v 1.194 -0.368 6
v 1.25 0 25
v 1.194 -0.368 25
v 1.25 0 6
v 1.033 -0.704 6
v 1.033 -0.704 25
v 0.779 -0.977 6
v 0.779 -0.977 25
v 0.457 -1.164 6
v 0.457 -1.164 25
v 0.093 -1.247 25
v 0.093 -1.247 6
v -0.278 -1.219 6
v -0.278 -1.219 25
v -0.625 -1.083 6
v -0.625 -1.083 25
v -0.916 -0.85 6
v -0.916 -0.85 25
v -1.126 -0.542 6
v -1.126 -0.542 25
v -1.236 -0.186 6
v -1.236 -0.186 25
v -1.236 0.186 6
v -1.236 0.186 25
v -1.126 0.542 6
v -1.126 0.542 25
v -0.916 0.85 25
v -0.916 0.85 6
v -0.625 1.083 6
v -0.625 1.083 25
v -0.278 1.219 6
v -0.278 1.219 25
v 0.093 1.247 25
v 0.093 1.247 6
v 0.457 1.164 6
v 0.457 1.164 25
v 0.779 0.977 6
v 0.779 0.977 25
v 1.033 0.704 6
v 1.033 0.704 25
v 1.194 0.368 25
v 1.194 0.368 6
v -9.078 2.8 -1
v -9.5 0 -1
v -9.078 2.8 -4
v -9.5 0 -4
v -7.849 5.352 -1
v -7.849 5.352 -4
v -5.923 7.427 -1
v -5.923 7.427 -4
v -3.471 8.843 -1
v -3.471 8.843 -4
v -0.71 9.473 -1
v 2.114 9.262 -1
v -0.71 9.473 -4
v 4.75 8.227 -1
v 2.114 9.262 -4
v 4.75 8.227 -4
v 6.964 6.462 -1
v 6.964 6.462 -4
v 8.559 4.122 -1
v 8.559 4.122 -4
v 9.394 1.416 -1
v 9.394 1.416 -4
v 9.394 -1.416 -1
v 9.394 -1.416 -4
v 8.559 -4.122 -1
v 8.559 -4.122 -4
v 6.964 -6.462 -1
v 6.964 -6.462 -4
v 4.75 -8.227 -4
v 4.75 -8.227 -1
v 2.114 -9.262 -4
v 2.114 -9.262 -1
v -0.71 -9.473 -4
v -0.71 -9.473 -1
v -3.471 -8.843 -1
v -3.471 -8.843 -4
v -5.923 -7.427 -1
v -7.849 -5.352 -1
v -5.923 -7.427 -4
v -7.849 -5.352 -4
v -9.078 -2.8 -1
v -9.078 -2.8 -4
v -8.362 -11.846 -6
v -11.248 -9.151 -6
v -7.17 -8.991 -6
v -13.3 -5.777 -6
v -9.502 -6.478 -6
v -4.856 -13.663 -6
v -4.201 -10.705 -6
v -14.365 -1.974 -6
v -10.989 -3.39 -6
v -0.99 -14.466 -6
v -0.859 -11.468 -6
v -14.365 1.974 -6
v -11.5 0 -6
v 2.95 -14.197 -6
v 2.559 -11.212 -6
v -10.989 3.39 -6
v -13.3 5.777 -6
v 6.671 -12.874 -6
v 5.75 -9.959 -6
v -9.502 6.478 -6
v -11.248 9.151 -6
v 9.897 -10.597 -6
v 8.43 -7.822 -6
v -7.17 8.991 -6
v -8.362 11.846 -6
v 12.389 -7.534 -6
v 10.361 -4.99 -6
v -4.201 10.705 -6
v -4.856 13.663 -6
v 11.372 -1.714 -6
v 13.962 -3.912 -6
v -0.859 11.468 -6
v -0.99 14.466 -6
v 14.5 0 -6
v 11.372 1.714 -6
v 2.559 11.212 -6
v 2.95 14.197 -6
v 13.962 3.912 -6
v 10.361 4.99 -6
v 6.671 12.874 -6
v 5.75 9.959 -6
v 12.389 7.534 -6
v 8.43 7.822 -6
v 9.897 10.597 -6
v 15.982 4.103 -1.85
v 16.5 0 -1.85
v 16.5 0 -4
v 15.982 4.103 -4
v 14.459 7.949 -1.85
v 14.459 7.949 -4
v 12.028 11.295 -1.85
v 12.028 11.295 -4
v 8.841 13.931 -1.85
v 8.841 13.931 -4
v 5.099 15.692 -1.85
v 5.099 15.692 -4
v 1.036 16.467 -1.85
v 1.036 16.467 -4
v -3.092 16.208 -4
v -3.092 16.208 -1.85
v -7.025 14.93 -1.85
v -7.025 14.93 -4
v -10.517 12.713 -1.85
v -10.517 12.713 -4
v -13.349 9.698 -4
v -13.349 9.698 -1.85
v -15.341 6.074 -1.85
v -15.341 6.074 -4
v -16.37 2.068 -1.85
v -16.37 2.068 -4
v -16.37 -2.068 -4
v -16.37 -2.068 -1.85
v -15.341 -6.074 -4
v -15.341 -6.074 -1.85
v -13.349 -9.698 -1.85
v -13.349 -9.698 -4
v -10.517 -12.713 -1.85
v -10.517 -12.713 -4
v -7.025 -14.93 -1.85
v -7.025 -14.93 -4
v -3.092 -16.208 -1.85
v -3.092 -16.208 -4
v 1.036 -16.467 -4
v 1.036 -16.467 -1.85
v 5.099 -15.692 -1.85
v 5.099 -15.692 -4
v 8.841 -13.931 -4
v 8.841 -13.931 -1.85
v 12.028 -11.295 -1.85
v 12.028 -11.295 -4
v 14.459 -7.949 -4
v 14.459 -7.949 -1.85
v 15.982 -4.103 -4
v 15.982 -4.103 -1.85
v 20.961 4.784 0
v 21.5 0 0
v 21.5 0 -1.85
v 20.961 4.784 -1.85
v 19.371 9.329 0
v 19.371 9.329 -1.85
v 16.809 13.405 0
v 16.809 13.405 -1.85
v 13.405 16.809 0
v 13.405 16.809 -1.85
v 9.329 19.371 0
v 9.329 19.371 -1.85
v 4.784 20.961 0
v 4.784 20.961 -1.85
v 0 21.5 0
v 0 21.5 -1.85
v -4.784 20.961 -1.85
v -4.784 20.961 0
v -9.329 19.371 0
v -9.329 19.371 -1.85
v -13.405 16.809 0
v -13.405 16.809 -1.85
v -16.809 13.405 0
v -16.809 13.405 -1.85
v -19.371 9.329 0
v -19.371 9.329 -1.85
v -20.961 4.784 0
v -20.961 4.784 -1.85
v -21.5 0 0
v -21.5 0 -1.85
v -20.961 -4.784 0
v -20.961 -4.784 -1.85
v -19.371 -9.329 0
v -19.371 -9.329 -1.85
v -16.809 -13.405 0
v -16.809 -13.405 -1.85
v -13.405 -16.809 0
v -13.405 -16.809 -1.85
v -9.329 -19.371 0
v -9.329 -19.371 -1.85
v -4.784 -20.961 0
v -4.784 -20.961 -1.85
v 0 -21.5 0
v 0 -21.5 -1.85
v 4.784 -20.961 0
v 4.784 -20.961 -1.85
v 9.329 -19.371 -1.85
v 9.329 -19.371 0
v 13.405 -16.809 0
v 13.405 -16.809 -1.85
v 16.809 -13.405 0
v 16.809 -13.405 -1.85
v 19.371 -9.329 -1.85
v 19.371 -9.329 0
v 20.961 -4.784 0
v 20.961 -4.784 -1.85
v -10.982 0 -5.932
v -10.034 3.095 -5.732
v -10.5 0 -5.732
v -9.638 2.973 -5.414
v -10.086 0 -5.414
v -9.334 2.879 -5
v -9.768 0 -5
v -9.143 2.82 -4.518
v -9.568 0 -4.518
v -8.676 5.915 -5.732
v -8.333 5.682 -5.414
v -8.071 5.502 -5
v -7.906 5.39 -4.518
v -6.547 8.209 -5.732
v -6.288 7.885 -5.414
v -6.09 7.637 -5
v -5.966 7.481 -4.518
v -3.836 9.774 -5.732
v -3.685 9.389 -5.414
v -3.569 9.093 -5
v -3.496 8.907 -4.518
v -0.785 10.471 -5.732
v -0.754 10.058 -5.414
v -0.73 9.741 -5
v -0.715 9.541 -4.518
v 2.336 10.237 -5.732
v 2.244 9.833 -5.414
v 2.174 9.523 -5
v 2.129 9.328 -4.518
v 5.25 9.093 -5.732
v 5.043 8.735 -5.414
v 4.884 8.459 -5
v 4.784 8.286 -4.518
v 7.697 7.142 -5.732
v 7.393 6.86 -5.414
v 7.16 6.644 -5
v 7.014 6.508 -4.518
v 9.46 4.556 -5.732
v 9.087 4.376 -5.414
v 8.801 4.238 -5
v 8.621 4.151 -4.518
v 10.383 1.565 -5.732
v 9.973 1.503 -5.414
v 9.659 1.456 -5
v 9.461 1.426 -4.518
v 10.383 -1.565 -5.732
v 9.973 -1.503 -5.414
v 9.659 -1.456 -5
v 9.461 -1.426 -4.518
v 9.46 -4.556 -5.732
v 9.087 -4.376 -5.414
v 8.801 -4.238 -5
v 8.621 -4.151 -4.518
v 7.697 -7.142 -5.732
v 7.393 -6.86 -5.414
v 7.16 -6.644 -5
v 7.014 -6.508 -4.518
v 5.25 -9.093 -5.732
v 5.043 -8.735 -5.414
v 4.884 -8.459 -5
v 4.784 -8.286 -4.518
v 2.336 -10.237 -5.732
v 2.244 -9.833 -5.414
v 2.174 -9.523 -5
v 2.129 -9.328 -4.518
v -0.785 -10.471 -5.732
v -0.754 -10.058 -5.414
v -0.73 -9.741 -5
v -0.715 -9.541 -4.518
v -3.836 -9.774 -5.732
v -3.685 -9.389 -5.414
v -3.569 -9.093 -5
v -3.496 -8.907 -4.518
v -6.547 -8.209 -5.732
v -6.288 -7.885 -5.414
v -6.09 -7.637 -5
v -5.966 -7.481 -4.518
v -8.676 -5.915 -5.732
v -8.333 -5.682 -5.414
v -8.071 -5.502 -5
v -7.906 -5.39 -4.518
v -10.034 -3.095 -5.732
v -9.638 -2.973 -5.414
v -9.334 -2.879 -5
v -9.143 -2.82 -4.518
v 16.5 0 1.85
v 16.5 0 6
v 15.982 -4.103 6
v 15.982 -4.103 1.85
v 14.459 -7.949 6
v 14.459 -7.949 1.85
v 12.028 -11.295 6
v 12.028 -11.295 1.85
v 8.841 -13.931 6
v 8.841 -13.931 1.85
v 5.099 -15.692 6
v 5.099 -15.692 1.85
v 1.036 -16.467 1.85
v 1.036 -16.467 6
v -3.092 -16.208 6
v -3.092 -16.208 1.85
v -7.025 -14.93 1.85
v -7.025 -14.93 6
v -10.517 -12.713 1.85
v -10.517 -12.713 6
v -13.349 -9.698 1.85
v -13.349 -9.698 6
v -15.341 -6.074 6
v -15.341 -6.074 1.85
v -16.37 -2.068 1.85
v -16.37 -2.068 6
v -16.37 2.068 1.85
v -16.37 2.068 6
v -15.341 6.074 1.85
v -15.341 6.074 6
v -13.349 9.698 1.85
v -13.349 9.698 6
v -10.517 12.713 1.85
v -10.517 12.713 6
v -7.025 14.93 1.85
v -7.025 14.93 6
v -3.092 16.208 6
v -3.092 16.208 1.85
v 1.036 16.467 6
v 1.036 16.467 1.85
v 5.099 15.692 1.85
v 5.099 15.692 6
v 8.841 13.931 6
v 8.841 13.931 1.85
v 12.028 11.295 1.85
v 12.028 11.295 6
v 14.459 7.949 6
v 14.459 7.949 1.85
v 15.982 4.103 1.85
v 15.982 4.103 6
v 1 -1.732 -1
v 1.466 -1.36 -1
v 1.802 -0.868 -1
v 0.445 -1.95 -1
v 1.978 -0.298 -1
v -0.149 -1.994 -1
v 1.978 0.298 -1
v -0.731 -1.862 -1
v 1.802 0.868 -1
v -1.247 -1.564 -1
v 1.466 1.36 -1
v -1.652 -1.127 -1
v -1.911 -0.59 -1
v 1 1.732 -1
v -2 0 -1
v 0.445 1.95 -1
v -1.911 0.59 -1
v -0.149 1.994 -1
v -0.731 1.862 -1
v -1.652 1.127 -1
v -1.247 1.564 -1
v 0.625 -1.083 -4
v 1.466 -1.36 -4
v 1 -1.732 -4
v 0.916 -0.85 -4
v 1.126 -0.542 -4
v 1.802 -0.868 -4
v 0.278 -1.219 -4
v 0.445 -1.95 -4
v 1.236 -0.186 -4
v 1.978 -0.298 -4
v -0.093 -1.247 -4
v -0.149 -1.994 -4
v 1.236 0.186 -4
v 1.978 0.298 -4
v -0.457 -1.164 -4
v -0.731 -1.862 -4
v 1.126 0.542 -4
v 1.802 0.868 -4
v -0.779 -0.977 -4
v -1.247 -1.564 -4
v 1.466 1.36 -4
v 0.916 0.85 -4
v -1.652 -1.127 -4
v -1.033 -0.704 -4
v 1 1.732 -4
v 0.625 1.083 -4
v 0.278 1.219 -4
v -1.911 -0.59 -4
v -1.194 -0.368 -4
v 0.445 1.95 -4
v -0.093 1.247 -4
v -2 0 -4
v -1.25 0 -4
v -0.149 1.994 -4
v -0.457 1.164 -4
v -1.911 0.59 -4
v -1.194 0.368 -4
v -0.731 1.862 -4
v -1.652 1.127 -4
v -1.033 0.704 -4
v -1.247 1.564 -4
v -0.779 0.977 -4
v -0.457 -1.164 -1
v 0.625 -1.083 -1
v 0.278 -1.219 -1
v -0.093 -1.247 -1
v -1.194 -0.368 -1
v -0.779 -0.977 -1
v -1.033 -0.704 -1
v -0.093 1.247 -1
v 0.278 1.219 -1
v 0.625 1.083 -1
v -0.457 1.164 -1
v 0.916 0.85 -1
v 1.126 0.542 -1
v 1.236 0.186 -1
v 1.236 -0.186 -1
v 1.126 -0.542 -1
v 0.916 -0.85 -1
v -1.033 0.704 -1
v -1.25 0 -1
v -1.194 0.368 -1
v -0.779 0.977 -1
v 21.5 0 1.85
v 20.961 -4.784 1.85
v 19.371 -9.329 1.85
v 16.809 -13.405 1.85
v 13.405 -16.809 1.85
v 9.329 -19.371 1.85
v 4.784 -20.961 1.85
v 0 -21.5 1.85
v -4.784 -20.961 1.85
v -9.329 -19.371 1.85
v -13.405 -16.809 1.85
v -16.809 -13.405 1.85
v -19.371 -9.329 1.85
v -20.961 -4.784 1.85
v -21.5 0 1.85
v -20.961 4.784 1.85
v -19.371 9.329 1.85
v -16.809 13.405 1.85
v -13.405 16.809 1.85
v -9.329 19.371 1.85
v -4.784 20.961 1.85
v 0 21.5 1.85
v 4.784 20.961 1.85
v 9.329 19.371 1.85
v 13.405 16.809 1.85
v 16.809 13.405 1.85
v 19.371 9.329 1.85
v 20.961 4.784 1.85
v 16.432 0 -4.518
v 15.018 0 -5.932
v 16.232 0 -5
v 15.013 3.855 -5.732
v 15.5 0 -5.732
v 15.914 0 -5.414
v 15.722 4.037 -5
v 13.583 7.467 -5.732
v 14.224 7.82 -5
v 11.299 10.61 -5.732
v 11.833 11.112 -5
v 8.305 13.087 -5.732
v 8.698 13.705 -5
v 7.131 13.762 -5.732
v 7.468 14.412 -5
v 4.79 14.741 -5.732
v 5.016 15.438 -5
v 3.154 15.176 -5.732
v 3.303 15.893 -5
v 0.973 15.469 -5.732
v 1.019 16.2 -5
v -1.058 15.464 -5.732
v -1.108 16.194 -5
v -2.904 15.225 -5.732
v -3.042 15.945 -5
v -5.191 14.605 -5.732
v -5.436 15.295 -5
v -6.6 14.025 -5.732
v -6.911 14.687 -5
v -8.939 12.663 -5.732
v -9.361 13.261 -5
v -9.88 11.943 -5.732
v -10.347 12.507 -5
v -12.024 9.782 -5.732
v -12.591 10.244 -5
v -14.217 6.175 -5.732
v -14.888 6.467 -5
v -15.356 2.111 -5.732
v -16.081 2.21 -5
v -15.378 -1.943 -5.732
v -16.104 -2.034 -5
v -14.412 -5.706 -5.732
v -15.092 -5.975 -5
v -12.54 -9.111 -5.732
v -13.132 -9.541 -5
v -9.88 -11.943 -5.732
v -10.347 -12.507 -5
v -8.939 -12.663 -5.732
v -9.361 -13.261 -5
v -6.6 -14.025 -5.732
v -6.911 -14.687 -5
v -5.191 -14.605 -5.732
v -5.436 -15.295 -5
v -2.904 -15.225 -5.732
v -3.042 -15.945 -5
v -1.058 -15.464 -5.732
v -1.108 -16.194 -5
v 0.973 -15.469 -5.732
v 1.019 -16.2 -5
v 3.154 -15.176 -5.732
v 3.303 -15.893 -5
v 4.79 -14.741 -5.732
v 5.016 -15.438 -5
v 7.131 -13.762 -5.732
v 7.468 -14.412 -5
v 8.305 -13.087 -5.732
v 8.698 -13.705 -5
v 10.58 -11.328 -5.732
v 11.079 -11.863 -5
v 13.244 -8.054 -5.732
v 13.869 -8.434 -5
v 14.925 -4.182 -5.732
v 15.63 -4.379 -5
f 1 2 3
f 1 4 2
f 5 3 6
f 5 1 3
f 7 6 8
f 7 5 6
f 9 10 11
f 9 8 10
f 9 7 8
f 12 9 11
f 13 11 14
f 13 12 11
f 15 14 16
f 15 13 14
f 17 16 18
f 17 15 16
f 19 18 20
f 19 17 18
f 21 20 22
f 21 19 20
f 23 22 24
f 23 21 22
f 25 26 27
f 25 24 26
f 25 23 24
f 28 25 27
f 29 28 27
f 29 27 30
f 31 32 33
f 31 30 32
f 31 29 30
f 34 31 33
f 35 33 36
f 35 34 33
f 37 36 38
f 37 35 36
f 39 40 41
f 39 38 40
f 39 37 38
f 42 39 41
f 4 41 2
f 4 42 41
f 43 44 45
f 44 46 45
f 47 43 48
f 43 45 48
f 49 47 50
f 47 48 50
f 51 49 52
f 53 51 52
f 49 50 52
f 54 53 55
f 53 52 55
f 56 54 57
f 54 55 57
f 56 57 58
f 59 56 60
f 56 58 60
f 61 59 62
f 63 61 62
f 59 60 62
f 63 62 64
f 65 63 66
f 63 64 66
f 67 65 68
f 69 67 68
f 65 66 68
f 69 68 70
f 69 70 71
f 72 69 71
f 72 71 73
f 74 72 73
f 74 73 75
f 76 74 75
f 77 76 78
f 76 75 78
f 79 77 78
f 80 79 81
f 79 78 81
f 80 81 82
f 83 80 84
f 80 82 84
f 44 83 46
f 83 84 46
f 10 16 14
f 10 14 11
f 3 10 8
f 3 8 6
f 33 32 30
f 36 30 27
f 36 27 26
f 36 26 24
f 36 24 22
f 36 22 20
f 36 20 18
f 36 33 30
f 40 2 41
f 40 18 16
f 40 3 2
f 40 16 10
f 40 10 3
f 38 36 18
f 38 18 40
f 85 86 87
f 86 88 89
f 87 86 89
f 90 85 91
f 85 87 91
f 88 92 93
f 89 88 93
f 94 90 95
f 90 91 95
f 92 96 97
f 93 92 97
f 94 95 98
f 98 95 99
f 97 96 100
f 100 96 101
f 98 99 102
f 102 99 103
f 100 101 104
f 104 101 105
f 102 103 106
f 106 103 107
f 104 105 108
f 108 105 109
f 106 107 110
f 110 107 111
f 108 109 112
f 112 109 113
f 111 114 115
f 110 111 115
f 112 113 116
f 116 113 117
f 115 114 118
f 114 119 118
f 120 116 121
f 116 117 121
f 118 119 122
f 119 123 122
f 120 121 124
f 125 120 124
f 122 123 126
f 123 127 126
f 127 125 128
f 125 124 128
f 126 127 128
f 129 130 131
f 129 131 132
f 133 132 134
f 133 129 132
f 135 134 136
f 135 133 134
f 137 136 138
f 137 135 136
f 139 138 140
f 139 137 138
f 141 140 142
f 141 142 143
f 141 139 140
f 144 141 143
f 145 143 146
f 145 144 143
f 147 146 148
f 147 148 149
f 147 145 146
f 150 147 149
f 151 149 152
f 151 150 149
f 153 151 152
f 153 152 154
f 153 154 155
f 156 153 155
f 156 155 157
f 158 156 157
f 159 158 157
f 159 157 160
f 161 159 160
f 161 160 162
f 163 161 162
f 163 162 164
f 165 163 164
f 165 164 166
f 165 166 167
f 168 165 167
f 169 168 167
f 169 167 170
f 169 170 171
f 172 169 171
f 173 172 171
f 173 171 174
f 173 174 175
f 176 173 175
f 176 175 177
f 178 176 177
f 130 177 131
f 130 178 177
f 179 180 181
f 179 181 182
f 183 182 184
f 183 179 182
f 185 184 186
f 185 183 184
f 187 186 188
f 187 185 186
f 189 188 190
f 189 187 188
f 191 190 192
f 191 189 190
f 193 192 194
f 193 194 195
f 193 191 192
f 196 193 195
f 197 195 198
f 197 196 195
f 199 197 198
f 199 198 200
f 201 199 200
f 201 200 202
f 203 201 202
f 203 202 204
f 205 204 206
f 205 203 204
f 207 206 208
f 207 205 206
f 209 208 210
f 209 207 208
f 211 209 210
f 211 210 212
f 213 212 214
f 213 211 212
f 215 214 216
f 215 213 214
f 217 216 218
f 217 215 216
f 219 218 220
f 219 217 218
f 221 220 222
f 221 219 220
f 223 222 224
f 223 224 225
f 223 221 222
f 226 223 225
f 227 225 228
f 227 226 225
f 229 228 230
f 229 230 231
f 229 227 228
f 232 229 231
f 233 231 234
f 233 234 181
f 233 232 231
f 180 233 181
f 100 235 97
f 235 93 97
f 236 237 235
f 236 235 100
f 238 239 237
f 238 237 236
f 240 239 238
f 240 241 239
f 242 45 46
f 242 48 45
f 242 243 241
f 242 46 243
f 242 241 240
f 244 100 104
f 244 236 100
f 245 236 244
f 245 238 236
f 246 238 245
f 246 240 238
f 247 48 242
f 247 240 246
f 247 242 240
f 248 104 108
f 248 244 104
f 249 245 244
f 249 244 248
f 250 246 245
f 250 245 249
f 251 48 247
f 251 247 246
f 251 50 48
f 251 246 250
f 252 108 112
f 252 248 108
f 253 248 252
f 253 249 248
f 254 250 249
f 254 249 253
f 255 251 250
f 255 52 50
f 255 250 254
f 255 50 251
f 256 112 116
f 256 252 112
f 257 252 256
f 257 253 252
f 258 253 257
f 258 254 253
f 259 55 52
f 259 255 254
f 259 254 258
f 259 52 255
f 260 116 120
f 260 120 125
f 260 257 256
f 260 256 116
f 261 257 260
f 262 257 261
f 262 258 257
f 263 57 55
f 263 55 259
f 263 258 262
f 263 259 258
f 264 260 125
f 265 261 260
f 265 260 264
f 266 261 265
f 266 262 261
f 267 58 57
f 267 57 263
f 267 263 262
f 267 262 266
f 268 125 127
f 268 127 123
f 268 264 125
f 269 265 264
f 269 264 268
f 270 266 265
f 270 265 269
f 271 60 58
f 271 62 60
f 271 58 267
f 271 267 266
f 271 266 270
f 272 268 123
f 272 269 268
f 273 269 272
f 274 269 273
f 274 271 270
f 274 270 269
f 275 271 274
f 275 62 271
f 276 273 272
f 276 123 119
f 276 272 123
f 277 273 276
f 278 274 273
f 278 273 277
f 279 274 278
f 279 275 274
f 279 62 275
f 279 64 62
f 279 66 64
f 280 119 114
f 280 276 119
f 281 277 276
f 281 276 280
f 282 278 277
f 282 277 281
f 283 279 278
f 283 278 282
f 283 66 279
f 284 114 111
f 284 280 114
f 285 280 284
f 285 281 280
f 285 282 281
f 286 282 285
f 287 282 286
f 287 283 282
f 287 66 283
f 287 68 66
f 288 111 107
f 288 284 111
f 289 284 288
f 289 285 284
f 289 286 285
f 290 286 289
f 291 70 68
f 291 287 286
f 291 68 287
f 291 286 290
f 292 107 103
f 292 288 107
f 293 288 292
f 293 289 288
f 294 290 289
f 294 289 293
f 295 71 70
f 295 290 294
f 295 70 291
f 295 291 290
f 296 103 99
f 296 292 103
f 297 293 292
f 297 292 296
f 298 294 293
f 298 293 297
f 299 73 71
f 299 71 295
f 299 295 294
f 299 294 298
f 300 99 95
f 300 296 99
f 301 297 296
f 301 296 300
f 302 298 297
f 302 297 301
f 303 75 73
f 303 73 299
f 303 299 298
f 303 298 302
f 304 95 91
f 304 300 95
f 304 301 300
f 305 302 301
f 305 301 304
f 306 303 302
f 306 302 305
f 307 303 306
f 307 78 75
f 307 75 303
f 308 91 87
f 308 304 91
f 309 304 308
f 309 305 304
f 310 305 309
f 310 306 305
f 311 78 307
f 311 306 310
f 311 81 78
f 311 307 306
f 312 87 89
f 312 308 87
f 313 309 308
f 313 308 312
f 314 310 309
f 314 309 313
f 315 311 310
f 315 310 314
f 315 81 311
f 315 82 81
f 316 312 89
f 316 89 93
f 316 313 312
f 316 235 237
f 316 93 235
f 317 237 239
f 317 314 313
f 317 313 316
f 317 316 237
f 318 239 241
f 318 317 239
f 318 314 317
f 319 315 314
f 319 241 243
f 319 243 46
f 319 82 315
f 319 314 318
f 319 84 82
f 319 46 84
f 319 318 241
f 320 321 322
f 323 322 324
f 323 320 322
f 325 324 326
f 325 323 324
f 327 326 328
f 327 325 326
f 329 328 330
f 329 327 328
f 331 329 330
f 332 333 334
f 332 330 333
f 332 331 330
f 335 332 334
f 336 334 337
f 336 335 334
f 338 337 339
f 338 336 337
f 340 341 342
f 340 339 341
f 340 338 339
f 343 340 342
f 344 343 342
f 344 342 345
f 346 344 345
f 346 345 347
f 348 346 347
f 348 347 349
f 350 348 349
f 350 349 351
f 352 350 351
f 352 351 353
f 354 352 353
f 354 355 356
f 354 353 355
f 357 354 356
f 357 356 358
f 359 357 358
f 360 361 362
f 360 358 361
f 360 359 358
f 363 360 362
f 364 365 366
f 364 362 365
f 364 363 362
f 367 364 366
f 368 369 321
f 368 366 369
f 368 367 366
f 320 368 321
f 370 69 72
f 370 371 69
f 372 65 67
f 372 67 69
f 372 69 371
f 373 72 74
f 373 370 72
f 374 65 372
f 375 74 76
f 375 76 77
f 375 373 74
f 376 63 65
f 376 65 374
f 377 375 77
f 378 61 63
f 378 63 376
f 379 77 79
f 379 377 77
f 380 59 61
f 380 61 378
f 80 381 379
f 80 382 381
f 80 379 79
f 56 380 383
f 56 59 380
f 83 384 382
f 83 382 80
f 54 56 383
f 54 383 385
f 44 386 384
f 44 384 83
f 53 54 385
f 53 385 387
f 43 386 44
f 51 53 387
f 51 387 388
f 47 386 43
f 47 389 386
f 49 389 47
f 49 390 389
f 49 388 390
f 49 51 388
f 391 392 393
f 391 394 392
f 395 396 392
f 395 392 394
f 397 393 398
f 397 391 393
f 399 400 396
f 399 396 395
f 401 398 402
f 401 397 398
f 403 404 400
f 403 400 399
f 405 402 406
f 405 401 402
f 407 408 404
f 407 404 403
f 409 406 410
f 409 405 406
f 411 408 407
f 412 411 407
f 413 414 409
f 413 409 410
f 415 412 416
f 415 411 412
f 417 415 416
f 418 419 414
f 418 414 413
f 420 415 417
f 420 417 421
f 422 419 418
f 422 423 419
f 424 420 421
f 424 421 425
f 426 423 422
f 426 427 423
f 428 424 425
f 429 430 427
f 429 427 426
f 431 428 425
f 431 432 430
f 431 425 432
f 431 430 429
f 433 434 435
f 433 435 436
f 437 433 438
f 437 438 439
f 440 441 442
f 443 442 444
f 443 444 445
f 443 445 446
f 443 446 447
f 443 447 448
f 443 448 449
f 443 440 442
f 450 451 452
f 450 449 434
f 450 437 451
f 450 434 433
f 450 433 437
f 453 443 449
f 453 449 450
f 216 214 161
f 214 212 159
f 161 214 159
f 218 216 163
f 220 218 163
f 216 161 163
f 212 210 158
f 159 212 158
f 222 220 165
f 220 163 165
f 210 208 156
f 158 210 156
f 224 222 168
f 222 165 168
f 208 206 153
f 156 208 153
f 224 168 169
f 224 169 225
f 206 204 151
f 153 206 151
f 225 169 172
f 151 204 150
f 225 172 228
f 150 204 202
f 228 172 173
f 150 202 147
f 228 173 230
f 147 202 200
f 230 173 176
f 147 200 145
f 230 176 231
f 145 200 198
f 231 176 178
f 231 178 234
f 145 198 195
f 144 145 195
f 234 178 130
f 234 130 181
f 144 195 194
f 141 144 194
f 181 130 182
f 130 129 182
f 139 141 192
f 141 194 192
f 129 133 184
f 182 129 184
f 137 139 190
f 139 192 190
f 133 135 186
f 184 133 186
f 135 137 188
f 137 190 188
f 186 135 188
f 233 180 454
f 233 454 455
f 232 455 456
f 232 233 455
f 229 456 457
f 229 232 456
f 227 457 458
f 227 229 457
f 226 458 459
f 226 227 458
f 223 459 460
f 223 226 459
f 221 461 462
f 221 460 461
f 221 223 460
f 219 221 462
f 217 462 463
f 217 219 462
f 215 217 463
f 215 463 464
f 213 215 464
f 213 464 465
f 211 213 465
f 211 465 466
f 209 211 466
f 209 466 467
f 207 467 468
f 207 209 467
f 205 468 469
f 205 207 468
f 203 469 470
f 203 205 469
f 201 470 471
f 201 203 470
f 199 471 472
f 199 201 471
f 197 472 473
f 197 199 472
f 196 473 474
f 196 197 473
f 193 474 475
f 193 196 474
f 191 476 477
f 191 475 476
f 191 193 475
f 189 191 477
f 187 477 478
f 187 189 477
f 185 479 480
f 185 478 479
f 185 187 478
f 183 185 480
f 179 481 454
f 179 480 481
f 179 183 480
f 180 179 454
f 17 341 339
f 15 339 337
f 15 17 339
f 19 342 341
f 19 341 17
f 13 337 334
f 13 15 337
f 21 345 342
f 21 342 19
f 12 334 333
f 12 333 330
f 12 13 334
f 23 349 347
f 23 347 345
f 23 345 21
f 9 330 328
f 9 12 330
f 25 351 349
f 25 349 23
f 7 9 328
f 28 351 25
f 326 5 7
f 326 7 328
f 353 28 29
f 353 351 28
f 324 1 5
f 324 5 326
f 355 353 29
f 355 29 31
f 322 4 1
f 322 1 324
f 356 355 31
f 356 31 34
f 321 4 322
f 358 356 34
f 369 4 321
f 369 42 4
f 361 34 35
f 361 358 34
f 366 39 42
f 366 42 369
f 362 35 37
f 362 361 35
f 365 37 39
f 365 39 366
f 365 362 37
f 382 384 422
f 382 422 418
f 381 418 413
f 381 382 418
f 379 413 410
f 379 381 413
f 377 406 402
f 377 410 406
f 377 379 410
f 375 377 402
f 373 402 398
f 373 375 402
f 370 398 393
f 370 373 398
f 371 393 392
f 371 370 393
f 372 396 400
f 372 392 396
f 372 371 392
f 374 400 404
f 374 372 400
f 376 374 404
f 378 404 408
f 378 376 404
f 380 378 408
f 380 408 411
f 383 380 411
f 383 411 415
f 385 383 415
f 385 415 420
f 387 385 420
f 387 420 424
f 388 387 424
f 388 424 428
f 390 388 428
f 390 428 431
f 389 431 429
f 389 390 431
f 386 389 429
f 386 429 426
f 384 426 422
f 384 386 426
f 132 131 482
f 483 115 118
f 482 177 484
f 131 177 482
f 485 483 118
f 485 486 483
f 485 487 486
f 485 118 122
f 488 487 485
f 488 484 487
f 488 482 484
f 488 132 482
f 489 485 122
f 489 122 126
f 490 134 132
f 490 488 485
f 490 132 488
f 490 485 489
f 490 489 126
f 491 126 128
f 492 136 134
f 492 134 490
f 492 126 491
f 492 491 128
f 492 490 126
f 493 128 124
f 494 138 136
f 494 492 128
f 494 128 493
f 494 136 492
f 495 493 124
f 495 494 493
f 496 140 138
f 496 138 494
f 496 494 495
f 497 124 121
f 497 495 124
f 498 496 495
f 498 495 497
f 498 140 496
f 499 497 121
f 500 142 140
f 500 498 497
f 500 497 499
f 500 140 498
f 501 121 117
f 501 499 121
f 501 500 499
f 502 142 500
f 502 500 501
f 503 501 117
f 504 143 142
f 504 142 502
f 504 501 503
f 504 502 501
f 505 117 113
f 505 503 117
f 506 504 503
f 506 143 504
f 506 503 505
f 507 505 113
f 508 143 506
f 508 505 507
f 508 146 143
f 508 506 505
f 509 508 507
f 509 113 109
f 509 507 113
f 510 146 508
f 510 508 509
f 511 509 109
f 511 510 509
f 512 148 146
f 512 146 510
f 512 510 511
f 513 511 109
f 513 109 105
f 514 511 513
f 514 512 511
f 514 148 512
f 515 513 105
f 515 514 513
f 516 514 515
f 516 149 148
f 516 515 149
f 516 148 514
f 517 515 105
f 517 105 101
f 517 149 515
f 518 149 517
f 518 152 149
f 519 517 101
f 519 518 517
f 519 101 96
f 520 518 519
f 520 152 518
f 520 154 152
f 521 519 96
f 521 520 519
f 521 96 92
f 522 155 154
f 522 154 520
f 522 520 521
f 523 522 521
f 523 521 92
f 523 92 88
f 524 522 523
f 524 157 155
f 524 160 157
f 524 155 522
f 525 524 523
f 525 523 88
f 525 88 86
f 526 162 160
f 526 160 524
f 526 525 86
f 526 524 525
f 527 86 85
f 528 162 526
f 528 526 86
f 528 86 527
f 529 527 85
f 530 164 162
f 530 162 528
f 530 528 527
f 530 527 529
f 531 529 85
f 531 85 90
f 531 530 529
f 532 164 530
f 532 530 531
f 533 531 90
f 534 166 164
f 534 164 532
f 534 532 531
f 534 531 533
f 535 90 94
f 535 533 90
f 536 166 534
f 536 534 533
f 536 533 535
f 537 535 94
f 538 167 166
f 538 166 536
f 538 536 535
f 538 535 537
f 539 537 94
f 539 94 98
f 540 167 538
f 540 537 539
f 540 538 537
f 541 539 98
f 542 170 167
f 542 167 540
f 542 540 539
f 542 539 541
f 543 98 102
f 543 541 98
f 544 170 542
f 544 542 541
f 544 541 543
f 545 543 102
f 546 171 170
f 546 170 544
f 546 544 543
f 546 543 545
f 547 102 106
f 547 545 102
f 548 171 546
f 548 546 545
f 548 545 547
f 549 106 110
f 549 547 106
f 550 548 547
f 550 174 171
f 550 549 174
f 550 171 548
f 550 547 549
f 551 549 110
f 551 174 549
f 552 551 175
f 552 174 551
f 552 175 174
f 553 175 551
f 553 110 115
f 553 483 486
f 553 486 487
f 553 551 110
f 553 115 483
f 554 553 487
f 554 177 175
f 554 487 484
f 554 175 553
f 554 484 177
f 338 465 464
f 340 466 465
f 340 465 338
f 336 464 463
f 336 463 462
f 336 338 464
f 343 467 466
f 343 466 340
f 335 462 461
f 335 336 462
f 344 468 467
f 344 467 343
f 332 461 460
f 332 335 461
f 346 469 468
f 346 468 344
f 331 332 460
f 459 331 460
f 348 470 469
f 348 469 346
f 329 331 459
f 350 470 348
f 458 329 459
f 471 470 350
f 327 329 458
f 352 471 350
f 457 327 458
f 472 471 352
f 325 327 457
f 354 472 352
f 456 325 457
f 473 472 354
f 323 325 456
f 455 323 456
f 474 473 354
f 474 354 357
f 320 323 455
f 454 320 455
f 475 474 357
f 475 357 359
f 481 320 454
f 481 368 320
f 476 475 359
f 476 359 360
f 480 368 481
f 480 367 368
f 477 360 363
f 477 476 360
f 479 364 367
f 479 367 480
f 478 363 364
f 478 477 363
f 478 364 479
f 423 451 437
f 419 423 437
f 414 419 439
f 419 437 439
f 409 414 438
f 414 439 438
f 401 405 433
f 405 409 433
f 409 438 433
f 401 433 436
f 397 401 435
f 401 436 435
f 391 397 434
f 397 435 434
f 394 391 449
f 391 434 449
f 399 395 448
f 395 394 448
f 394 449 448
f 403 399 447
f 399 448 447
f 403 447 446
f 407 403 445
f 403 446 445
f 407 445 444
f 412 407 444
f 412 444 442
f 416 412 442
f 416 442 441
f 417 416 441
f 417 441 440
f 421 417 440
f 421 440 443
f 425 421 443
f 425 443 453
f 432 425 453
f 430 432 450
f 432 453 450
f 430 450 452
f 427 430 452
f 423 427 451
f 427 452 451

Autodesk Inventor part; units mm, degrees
ref_plane "YZ Plane" through (0, 0, 0) normal (1, 0, 0) x (0, 1, 0)
ref_plane "XZ Plane" through (0, 0, 0) normal (0, 1, 0) x (-1, 0, 0)
ref_plane "XY Plane" through (0, 0, 0) normal (0, 0, 1) x (1, 0, 0)
sketch "Sketch2" plane through (0, 0, 0) normal (0, 0, 1) x (1, 0, 0)
  circle A0 centre (0, 0) radius 16.5
  dimension "d0" = 33
extrude "Extrusion1" add sketch "Sketch2" along normal mid plane 12
sketch "Sketch3" plane through (0, 0, 6) normal (0, 0, 1) x (1, 0, 0)
  circle A0 centre (0, 0) radius 1.25
  dimension "d3" = 2.5
extrude "Extrusion2" add sketch "Sketch3" along normal blind 19
ref_plane "Work Plane1" through (0, 0, 15.5) normal (0, 0, 1) x (1, 0, 0)
sketch "Sketch7" plane through (0, 0, 0) normal (0, 0, 1) x (1, 0, 0)
  circle A0 centre (0, 0) radius 21.5
  dimension "d19" = 43
extrude "Extrusion6" add sketch "Sketch7" along normal mid plane 3.7
sketch "Sketch12" plane through (0, 0, -6) normal (0, 0, -1) x (-1, 0, 0)
  circle A0 centre (0, 0) radius 16.5 projected
  circle A1 centre (0, 0) radius 9.5
extrude "Extrusion9" cut sketch "Sketch12" against normal blind 5 contours A1
sketch "Sketch13" plane through (0, 0, -1) normal (0, 0, -1) x (-1, 0, 0)
  circle A0 centre (0, 0) radius 2
  circle A1 centre (0, 0) radius 1.25 projected
  dimension "d33" = 2
extrude "Extrusion10" add sketch "Sketch13" along normal blind 3
fillet "Fillet1" radius 2 1 edges at (9.5, 0, -6)
fillet "Fillet2" radius 2 1 edges at (-16.5, 0, -6)
properties part number "robot" material "PBT Plastic"
